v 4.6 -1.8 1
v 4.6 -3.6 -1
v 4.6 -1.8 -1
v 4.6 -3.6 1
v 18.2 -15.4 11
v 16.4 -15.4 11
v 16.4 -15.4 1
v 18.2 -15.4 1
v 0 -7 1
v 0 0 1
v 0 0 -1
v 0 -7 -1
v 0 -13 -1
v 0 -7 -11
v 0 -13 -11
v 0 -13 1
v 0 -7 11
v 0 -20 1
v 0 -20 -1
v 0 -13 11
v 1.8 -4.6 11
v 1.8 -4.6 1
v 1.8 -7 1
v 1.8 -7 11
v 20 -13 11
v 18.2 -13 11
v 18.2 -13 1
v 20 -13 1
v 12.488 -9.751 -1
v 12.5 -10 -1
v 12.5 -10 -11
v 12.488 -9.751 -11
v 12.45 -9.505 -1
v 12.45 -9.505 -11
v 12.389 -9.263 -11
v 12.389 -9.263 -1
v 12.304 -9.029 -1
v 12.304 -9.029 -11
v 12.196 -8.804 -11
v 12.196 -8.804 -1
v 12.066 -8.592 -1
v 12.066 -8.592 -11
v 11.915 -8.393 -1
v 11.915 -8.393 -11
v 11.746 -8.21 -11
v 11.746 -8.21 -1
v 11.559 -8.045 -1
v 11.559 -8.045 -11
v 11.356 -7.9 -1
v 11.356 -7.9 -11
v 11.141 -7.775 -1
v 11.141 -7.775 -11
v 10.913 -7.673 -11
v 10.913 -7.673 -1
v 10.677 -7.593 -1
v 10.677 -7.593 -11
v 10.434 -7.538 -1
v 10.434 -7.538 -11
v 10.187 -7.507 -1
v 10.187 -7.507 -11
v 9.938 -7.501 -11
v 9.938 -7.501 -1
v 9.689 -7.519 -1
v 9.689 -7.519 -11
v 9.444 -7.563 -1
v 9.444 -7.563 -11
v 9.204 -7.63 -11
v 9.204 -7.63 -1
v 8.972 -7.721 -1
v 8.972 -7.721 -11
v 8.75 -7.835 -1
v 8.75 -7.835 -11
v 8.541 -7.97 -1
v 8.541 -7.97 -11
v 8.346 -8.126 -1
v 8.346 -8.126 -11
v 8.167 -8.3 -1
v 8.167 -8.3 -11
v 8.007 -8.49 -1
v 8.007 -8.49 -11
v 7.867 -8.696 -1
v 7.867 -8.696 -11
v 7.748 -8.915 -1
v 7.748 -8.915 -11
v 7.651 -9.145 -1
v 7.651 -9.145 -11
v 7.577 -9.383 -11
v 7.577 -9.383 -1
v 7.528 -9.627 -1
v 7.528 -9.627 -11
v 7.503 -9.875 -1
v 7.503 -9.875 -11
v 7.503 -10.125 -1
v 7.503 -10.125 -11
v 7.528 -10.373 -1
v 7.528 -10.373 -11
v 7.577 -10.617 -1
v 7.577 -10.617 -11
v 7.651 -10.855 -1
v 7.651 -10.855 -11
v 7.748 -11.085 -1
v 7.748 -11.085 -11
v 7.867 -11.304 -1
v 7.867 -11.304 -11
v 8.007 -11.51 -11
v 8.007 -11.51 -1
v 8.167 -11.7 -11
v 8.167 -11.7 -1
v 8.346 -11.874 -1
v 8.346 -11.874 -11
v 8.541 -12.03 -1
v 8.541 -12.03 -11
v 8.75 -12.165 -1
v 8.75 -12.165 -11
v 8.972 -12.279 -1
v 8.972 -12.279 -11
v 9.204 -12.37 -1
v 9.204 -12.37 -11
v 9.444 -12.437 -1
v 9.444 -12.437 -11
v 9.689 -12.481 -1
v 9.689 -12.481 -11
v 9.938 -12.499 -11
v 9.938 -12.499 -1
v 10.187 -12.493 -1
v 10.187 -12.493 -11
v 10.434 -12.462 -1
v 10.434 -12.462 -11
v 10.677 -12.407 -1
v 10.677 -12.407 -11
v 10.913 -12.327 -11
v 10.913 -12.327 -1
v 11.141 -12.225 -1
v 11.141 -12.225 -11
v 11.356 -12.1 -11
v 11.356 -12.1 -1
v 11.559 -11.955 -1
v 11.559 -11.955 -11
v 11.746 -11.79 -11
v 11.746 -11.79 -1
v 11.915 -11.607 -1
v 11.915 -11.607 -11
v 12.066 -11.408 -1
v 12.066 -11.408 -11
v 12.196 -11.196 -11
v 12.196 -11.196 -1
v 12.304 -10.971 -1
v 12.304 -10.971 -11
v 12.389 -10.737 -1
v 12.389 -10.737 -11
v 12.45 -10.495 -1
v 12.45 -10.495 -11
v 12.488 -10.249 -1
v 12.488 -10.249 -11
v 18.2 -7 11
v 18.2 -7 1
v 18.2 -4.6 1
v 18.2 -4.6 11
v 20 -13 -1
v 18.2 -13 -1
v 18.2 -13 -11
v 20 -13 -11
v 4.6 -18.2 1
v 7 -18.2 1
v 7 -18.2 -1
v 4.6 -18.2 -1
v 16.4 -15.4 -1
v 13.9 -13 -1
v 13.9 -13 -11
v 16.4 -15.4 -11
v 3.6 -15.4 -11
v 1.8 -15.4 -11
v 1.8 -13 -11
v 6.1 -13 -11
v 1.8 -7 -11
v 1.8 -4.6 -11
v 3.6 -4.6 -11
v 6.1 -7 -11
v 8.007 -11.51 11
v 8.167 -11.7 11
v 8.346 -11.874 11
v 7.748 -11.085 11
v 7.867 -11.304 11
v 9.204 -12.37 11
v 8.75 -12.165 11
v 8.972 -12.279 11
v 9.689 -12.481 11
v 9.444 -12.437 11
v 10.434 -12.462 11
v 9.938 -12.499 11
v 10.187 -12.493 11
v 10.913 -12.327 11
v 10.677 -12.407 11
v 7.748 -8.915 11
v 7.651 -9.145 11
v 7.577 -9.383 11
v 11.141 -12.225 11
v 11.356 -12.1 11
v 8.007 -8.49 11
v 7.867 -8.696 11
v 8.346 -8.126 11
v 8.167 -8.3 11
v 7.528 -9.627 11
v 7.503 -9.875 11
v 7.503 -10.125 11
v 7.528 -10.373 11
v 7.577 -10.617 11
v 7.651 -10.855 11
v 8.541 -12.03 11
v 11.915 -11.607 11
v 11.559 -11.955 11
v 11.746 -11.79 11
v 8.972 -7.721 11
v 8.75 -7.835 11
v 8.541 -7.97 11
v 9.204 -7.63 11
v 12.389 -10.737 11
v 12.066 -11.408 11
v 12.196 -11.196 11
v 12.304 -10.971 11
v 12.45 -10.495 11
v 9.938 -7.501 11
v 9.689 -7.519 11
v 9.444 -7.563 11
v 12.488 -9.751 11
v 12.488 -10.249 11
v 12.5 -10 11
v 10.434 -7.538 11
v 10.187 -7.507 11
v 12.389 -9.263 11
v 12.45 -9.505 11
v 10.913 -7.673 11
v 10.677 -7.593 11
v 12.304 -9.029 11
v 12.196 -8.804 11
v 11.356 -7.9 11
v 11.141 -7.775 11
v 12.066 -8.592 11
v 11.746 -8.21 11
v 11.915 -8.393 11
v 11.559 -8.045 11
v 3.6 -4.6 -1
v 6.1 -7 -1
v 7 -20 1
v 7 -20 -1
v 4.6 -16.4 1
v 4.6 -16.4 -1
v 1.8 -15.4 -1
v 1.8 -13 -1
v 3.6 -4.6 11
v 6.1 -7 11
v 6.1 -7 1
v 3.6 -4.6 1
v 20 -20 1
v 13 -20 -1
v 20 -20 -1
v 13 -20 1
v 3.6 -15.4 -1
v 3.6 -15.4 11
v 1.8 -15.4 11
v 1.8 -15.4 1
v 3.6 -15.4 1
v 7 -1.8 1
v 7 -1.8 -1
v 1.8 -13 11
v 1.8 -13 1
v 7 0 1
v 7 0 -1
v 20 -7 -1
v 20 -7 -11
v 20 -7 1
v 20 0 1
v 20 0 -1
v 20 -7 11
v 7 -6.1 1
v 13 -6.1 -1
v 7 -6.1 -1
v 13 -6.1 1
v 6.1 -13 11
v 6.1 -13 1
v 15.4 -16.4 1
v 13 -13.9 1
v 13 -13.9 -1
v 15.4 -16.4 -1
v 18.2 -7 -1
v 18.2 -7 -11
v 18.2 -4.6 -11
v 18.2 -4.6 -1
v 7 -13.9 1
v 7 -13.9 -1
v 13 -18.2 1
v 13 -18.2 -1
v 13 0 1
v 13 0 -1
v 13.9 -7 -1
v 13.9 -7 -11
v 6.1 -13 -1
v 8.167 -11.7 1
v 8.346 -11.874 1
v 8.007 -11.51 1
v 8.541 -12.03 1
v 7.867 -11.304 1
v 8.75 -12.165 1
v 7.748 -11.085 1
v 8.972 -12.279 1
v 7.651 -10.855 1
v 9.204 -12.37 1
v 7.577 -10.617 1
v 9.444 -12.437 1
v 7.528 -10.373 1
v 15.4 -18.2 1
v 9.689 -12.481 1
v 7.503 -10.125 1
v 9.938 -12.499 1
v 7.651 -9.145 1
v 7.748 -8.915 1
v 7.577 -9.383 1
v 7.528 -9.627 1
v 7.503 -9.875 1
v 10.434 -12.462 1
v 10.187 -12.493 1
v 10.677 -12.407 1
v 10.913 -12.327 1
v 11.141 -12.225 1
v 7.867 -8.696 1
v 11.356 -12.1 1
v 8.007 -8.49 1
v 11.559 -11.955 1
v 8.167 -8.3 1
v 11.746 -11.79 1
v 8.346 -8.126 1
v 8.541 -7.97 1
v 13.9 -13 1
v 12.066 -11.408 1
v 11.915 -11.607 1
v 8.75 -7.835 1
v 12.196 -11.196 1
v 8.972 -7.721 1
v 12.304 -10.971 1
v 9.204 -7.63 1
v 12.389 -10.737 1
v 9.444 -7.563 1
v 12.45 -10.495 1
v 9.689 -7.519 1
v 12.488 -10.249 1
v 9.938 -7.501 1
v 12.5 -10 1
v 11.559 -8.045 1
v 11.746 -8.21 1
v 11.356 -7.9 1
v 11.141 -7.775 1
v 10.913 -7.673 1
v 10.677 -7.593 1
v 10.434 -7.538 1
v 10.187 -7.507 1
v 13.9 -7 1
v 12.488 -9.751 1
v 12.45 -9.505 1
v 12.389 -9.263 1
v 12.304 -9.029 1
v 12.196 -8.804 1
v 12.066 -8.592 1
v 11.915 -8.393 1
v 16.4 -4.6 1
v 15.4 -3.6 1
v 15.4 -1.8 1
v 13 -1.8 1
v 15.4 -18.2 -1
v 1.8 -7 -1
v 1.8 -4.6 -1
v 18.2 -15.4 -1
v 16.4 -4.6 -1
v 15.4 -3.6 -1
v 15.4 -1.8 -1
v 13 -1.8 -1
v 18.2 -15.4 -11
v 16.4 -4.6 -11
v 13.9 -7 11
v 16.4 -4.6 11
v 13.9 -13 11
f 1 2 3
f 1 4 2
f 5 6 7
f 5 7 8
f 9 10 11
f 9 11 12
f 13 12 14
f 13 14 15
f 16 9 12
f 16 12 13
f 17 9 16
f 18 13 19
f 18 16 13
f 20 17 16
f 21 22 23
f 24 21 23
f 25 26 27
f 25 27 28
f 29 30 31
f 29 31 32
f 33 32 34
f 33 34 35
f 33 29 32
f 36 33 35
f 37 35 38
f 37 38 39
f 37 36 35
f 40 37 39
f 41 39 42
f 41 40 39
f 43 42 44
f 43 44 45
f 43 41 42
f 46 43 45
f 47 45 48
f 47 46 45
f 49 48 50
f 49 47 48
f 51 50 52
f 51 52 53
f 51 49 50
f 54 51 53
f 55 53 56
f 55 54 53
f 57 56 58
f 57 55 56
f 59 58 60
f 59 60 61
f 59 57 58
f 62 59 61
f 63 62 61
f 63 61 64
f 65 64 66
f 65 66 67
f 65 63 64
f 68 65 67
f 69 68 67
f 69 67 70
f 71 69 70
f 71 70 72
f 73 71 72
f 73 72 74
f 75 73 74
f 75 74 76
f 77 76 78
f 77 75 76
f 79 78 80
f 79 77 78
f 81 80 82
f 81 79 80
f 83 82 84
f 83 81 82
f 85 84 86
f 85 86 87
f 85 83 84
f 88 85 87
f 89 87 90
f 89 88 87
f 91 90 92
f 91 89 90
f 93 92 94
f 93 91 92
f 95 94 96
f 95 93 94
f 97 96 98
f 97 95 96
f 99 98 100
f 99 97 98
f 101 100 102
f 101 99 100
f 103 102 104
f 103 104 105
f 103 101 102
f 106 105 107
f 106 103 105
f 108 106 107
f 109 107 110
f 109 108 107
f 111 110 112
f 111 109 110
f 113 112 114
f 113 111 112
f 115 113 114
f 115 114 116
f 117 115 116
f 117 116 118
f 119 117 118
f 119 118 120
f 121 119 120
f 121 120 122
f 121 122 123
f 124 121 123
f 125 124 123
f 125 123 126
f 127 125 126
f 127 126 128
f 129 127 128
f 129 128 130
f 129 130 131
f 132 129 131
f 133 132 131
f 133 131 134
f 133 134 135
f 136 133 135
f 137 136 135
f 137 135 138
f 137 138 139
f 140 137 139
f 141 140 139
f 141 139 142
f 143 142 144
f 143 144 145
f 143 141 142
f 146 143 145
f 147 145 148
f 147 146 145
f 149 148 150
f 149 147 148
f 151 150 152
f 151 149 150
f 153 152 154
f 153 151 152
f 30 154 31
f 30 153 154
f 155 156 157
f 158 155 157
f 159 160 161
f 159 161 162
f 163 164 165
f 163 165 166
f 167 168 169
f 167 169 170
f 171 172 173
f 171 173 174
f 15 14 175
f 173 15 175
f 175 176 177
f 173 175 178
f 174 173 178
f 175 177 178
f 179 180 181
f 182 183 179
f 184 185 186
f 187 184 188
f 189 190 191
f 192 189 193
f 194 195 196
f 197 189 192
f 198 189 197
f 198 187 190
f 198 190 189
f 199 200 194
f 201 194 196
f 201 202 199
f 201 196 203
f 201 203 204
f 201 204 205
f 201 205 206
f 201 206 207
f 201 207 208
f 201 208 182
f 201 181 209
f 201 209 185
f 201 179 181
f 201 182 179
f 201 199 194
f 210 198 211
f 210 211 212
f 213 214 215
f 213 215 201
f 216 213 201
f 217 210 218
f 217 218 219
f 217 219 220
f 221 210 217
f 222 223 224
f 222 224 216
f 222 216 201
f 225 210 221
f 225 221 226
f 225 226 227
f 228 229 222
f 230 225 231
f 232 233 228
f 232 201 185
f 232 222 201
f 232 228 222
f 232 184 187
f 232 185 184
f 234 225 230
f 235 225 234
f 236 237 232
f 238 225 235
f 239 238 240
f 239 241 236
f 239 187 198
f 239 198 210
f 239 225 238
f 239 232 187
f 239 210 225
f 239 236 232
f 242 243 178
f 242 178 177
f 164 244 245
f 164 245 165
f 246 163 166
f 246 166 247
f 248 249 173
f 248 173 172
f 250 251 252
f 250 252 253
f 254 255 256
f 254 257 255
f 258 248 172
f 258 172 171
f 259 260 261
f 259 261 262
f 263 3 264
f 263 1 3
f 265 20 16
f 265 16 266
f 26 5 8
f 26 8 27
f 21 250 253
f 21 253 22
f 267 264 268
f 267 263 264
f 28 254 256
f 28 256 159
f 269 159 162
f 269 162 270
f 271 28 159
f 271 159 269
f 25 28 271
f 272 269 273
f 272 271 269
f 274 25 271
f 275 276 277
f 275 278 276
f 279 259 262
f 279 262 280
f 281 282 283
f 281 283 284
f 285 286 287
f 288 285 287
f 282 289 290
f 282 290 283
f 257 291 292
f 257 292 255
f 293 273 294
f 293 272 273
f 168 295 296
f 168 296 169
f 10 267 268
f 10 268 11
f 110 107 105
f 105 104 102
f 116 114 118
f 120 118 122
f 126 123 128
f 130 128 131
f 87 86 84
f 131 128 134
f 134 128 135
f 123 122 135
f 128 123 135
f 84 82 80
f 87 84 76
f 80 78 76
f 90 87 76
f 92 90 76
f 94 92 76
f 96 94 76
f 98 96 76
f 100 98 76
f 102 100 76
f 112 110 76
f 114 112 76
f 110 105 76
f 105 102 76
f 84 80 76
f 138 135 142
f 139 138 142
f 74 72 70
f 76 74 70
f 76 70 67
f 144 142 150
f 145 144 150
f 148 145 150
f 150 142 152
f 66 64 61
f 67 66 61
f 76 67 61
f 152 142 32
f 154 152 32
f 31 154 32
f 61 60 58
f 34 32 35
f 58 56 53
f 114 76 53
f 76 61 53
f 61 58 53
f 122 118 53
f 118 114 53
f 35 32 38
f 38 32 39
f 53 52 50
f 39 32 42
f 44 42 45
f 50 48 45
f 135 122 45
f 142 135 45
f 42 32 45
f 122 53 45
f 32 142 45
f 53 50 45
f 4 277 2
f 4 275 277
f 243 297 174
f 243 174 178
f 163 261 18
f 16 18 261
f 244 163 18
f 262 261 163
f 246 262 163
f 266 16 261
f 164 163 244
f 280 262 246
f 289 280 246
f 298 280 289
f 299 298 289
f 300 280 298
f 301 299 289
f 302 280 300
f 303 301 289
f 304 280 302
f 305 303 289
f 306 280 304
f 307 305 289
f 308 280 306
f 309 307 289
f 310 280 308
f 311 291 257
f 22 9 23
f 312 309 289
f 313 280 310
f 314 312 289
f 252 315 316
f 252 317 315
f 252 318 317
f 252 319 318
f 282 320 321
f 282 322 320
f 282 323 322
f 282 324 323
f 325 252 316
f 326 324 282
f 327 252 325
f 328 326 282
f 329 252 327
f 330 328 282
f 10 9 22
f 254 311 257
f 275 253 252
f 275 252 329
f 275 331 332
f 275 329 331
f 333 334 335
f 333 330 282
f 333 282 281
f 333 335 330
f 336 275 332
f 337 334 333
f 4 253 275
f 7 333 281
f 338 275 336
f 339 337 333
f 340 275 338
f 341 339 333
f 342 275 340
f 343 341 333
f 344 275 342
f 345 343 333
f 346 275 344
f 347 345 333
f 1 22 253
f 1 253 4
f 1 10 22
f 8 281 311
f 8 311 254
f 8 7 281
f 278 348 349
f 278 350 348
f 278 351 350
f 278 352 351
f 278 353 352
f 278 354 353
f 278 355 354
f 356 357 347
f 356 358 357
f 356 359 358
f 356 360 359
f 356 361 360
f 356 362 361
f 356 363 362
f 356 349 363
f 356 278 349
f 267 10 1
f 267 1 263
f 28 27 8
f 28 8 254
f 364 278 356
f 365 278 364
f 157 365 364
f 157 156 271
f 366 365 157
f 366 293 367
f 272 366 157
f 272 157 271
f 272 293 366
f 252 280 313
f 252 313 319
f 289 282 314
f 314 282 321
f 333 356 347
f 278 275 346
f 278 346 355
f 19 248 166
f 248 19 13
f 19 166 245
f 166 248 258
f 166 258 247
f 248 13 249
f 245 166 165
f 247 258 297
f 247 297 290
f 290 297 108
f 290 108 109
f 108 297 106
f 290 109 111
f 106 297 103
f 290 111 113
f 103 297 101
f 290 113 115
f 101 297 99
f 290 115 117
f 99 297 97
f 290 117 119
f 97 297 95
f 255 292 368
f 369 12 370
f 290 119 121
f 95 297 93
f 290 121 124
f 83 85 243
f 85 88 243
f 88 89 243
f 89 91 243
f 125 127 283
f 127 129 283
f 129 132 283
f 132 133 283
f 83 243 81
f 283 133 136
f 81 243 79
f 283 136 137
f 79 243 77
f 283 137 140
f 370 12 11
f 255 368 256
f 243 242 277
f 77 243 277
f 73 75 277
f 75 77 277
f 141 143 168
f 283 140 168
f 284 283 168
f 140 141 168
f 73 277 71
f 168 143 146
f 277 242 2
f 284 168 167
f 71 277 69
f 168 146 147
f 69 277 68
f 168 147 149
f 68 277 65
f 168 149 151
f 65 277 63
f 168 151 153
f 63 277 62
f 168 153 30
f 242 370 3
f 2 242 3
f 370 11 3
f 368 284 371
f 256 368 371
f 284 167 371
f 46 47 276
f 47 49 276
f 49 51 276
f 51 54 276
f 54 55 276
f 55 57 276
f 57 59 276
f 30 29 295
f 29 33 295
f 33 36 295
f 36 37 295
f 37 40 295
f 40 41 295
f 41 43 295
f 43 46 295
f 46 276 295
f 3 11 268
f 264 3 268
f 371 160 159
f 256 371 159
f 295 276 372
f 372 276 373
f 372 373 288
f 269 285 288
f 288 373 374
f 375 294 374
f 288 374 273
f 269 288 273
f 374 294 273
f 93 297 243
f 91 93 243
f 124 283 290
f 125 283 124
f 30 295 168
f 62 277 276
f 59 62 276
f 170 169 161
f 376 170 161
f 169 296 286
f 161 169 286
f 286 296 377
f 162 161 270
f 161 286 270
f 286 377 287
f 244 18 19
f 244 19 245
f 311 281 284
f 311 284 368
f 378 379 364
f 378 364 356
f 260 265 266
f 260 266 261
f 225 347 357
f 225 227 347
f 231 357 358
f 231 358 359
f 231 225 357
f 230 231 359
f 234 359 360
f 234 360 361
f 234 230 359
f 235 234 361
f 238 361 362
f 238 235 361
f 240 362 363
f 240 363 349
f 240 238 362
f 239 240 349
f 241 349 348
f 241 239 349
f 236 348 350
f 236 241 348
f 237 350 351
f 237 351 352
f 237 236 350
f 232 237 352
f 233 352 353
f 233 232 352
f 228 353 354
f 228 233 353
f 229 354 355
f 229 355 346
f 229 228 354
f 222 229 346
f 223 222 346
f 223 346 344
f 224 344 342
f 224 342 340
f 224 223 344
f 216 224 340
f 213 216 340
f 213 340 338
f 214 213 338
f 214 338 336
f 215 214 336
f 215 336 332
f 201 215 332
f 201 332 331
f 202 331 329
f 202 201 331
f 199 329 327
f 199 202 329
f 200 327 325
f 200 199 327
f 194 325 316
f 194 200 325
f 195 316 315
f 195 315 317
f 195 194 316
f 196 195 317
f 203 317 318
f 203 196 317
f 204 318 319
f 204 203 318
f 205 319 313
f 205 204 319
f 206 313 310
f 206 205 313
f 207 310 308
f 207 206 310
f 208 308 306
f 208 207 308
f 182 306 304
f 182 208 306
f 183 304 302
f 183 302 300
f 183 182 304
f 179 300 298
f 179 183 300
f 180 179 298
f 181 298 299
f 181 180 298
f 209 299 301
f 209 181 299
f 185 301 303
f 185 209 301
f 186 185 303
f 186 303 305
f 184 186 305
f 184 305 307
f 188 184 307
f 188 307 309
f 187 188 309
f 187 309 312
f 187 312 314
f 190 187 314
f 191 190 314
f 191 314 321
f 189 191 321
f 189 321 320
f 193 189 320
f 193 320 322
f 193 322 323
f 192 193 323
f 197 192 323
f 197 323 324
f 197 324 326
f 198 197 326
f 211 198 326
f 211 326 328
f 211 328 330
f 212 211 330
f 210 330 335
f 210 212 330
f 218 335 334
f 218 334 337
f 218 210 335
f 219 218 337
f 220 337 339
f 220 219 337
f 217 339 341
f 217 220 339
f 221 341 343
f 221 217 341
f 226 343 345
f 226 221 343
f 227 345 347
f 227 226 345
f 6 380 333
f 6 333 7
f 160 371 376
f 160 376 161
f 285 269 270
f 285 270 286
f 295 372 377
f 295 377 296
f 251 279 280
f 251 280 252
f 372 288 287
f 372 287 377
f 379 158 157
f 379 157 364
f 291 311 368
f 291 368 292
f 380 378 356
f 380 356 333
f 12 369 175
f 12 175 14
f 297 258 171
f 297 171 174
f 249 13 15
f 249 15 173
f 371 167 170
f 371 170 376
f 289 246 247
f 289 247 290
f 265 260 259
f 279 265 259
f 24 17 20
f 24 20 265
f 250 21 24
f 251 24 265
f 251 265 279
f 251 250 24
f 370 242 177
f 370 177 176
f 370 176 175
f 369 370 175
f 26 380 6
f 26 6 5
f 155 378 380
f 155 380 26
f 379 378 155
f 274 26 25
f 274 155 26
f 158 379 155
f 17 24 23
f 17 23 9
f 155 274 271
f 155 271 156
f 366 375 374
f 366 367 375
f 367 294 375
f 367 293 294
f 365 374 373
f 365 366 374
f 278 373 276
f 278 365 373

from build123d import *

# Parameters (mm, degrees)
BOSS_EXTRUDE1_DEPTH   = 11
BOSS_EXTRUDE1_2_DEPTH = 11
SKETCH1_R             = 2.5
BOSS_EXTRUDE1_3_DEPTH = 11
SKETCH1_11_R          = 2.5
BOSS_EXTRUDE2_DEPTH   = 1


with BuildPart() as part:
    # Sketch1 → Boss-Extrude1 (new, symmetric)
    with BuildSketch(Plane.XY):
        Polygon((0, -7), (0, -13), (1.8, -13), (1.8, -15.4), (3.6, -15.4), (6.1, -13), (6.1, -7), (3.6, -4.6), (1.8, -4.6), (1.8, -7), align=None)
    extrude(amount=BOSS_EXTRUDE1_DEPTH, both=True)



with BuildPart() as body_2:
    # Sketch1 → Boss-Extrude1 2 (new, symmetric)
    with BuildSketch(Plane.XY):
        Polygon((20, -7), (18.2, -7), (18.2, -4.6), (16.4, -4.6), (13.9, -7), (13.9, -13), (16.4, -15.4), (18.2, -15.4), (18.2, -13), (20, -13), align=None)
    extrude(amount=BOSS_EXTRUDE1_2_DEPTH, both=True)


with BuildPart() as body_3:
    # Sketch1 → Boss-Extrude1 3 (new, symmetric)
    with BuildSketch(Plane.XY):
        with Locations((10, -10)):
            Circle(SKETCH1_R)
    extrude(amount=BOSS_EXTRUDE1_3_DEPTH, both=True)


with BuildPart() as part_1:
    add(part.part)

    add(body_2.part)  # Boss-Extrude2 merges body 2

    add(body_3.part)  # Boss-Extrude2 merges body 3
    # Sketch1<11> → Boss-Extrude2 (add, symmetric)
    with BuildSketch(Plane.XY):
        Polygon((7, -1.8), (7, 0), (0, 0), (0, -7), (0.4, -7), (1.8, -7), (1.8, -4.6), (2.2, -4.6), (3.6, -4.6), (6.1, -7), (6.1, -13), (3.6, -15.4), (1.8, -15.4), (1.8, -13), (0.4, -13), (0, -13), (0, -20), (7, -20), (7, -18.2), (4.6, -18.2), (4.6, -16.4), (7, -13.9), (7.016, -13.9), (13, -13.9), (15.4, -16.4), (15.4, -18.2), (13, -18.2), (13, -19.6), (13, -20), (20, -20), (20, -13), (18.2, -13), (18.2, -15), (18.2, -15.4), (16.4, -15.4), (13.9, -13), (13.9, -12.6), (13.9, -7), (16.4, -4.6), (18.2, -4.6), (18.2, -7), (20, -7), (20, -6.6), (20, 0), (13, 0), (13, -1.8), (15.4, -1.8), (15.4, -3.6), (13, -6.1), (7, -6.1), (4.6, -3.6), (4.6, -1.8), align=None)
        with Locations((10, -10)):
            Circle(SKETCH1_11_R, mode=Mode.SUBTRACT)
    extrude(amount=BOSS_EXTRUDE2_DEPTH, both=True)


solid = part_1.part
